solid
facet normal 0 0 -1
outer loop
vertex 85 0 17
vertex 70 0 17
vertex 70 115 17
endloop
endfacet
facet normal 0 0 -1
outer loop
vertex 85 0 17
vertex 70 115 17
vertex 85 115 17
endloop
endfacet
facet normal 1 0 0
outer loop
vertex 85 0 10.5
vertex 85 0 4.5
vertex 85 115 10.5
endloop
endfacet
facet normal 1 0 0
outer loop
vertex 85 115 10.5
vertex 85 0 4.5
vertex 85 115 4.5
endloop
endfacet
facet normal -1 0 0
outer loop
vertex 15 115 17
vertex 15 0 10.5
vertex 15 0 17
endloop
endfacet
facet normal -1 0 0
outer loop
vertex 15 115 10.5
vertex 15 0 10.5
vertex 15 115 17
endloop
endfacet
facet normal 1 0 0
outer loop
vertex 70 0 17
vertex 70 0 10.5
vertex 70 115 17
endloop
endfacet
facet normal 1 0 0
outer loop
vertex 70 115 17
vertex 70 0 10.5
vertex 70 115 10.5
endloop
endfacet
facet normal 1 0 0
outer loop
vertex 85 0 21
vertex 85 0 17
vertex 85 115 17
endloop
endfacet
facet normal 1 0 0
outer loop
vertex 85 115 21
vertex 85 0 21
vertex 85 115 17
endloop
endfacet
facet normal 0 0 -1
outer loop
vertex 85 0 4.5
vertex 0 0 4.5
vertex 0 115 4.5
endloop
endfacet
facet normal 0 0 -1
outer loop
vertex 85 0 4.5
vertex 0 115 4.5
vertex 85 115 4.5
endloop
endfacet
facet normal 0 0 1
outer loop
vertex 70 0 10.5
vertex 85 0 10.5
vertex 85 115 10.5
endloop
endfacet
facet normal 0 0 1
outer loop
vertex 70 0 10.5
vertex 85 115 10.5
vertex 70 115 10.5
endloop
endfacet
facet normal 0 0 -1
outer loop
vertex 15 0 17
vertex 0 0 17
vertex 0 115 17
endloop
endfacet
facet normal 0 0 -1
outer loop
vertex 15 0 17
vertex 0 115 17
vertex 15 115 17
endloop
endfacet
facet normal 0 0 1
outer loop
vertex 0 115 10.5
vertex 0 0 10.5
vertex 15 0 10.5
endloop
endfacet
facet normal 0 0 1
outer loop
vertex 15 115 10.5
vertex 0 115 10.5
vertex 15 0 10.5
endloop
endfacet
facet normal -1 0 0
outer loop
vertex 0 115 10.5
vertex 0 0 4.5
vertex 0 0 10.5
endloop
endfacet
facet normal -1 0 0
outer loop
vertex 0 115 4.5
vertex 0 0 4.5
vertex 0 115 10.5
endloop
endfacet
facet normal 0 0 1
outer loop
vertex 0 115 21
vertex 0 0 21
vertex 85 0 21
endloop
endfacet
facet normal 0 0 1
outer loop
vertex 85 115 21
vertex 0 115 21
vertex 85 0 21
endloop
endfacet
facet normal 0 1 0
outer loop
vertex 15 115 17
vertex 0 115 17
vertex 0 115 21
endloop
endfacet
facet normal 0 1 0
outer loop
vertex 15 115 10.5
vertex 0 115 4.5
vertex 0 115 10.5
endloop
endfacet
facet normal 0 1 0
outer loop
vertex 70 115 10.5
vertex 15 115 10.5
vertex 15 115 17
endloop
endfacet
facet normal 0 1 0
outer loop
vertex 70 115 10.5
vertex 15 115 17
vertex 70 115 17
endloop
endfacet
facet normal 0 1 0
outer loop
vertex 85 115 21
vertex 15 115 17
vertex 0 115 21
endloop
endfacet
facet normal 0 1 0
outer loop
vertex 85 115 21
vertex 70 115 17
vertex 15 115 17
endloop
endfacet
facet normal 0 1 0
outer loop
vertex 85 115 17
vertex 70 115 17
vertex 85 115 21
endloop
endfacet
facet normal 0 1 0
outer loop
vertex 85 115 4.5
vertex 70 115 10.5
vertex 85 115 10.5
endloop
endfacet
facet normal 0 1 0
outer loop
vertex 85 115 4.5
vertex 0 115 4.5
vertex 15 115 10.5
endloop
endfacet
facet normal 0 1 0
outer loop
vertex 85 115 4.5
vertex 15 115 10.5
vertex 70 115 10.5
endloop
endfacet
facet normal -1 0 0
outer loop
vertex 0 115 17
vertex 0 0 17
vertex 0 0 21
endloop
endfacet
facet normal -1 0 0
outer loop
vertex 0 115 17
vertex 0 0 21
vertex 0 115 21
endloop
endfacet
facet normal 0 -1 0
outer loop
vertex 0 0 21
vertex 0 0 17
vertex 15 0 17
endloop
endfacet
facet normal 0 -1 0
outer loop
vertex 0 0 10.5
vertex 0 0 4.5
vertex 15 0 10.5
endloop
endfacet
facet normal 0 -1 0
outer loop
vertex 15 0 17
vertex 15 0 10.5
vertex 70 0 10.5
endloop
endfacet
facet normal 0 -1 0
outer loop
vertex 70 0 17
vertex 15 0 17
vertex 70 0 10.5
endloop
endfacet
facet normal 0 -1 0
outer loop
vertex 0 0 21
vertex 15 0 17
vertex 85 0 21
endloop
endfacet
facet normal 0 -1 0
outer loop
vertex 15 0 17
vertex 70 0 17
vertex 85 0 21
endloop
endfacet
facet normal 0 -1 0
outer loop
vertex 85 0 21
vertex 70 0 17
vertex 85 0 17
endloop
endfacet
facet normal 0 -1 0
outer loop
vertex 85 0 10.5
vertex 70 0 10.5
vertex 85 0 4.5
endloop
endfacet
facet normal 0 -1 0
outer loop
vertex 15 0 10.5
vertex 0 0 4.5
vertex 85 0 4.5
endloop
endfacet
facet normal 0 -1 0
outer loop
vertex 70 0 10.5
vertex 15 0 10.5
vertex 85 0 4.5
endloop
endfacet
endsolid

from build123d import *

# Parameters (mm, degrees)
SKETCH2_W               = 85
SKETCH2_H               = 115
BOSS_EXTRUDE1_DEPTH     = 15
SKETCH3_W               = 15
SKETCH3_H               = 4.5
CUT_EXTRUDE1_DEPTH      = 144.788038445
MIRROR2_COPY_1_SKETCH_W = 15
MIRROR2_COPY_1_SKETCH_H = 4.5
MIRROR2_COPY_1_DEPTH    = 144.788038445
SKETCH4_W               = 55
SKETCH4_H               = 115
BOSS_EXTRUDE2_DEPTH     = 2
SKETCH6_W               = 55
SKETCH6_H               = 115
CUT_EXTRUDE2_DEPTH      = 4.5
SKETCH5_W               = 85
SKETCH5_H               = 115
BOSS_EXTRUDE3_DEPTH     = 4


with BuildPart() as part:
    # Sketch2 → Boss-Extrude1 (new body)
    with BuildSketch(Plane.XY):
        with Locations((42.5, 57.5)):
            Rectangle(SKETCH2_W, SKETCH2_H)
    extrude(amount=BOSS_EXTRUDE1_DEPTH)

    # Sketch3 → Cut-Extrude1 (cut, through all)
    with BuildSketch(Plane(origin=(0, 115, 0), x_dir=(1, 0, 0), z_dir=(0, 1, 0))):
        with Locations((7.5, -12.75)):
            Rectangle(SKETCH3_W, SKETCH3_H)
    cut_extrude1 = extrude(amount=-CUT_EXTRUDE1_DEPTH, mode=Mode.SUBTRACT)

    # Mirror1: Cut-Extrude1 across plane
    add(cut_extrude1.mirror(Plane.XY.offset(7.5)), mode=Mode.SUBTRACT)

    # Mirror2: Cut-Extrude1 across plane
    add(cut_extrude1.mirror(Plane.ZY.offset(-42.5)), mode=Mode.SUBTRACT)

    # Mirror2 copy 1 sketch → Mirror2 copy 1 (cut, through all)
    with BuildSketch(Plane(origin=(85, 115, 15), x_dir=(-1, 0, 0), z_dir=(0, 1, 0))):
        with Locations((7.5, -12.75)):
            Rectangle(MIRROR2_COPY_1_SKETCH_W, MIRROR2_COPY_1_SKETCH_H)
    extrude(amount=-MIRROR2_COPY_1_DEPTH, mode=Mode.SUBTRACT)

    # Sketch4 → Boss-Extrude2 (add)
    with BuildSketch(Plane.XY.offset(15)):
        with Locations((42.5, 57.5)):
            Rectangle(SKETCH4_W, SKETCH4_H)
    extrude(amount=BOSS_EXTRUDE2_DEPTH)

    # Sketch6 → Cut-Extrude2 (cut)
    with BuildSketch(Plane(origin=(0, 0, 0), x_dir=(-1, 0, 0), z_dir=(0, 0, -1))):
        with Locations((-42.5, 57.5)):
            Rectangle(SKETCH6_W, SKETCH6_H)
    extrude(amount=-CUT_EXTRUDE2_DEPTH, mode=Mode.SUBTRACT)

    # Sketch5 → Boss-Extrude3 (add)
    with BuildSketch(Plane.XY.offset(17)):
        with Locations((42.5, 57.5)):
            Rectangle(SKETCH5_W, SKETCH5_H)
    extrude(amount=BOSS_EXTRUDE3_DEPTH)


solid = part.part
